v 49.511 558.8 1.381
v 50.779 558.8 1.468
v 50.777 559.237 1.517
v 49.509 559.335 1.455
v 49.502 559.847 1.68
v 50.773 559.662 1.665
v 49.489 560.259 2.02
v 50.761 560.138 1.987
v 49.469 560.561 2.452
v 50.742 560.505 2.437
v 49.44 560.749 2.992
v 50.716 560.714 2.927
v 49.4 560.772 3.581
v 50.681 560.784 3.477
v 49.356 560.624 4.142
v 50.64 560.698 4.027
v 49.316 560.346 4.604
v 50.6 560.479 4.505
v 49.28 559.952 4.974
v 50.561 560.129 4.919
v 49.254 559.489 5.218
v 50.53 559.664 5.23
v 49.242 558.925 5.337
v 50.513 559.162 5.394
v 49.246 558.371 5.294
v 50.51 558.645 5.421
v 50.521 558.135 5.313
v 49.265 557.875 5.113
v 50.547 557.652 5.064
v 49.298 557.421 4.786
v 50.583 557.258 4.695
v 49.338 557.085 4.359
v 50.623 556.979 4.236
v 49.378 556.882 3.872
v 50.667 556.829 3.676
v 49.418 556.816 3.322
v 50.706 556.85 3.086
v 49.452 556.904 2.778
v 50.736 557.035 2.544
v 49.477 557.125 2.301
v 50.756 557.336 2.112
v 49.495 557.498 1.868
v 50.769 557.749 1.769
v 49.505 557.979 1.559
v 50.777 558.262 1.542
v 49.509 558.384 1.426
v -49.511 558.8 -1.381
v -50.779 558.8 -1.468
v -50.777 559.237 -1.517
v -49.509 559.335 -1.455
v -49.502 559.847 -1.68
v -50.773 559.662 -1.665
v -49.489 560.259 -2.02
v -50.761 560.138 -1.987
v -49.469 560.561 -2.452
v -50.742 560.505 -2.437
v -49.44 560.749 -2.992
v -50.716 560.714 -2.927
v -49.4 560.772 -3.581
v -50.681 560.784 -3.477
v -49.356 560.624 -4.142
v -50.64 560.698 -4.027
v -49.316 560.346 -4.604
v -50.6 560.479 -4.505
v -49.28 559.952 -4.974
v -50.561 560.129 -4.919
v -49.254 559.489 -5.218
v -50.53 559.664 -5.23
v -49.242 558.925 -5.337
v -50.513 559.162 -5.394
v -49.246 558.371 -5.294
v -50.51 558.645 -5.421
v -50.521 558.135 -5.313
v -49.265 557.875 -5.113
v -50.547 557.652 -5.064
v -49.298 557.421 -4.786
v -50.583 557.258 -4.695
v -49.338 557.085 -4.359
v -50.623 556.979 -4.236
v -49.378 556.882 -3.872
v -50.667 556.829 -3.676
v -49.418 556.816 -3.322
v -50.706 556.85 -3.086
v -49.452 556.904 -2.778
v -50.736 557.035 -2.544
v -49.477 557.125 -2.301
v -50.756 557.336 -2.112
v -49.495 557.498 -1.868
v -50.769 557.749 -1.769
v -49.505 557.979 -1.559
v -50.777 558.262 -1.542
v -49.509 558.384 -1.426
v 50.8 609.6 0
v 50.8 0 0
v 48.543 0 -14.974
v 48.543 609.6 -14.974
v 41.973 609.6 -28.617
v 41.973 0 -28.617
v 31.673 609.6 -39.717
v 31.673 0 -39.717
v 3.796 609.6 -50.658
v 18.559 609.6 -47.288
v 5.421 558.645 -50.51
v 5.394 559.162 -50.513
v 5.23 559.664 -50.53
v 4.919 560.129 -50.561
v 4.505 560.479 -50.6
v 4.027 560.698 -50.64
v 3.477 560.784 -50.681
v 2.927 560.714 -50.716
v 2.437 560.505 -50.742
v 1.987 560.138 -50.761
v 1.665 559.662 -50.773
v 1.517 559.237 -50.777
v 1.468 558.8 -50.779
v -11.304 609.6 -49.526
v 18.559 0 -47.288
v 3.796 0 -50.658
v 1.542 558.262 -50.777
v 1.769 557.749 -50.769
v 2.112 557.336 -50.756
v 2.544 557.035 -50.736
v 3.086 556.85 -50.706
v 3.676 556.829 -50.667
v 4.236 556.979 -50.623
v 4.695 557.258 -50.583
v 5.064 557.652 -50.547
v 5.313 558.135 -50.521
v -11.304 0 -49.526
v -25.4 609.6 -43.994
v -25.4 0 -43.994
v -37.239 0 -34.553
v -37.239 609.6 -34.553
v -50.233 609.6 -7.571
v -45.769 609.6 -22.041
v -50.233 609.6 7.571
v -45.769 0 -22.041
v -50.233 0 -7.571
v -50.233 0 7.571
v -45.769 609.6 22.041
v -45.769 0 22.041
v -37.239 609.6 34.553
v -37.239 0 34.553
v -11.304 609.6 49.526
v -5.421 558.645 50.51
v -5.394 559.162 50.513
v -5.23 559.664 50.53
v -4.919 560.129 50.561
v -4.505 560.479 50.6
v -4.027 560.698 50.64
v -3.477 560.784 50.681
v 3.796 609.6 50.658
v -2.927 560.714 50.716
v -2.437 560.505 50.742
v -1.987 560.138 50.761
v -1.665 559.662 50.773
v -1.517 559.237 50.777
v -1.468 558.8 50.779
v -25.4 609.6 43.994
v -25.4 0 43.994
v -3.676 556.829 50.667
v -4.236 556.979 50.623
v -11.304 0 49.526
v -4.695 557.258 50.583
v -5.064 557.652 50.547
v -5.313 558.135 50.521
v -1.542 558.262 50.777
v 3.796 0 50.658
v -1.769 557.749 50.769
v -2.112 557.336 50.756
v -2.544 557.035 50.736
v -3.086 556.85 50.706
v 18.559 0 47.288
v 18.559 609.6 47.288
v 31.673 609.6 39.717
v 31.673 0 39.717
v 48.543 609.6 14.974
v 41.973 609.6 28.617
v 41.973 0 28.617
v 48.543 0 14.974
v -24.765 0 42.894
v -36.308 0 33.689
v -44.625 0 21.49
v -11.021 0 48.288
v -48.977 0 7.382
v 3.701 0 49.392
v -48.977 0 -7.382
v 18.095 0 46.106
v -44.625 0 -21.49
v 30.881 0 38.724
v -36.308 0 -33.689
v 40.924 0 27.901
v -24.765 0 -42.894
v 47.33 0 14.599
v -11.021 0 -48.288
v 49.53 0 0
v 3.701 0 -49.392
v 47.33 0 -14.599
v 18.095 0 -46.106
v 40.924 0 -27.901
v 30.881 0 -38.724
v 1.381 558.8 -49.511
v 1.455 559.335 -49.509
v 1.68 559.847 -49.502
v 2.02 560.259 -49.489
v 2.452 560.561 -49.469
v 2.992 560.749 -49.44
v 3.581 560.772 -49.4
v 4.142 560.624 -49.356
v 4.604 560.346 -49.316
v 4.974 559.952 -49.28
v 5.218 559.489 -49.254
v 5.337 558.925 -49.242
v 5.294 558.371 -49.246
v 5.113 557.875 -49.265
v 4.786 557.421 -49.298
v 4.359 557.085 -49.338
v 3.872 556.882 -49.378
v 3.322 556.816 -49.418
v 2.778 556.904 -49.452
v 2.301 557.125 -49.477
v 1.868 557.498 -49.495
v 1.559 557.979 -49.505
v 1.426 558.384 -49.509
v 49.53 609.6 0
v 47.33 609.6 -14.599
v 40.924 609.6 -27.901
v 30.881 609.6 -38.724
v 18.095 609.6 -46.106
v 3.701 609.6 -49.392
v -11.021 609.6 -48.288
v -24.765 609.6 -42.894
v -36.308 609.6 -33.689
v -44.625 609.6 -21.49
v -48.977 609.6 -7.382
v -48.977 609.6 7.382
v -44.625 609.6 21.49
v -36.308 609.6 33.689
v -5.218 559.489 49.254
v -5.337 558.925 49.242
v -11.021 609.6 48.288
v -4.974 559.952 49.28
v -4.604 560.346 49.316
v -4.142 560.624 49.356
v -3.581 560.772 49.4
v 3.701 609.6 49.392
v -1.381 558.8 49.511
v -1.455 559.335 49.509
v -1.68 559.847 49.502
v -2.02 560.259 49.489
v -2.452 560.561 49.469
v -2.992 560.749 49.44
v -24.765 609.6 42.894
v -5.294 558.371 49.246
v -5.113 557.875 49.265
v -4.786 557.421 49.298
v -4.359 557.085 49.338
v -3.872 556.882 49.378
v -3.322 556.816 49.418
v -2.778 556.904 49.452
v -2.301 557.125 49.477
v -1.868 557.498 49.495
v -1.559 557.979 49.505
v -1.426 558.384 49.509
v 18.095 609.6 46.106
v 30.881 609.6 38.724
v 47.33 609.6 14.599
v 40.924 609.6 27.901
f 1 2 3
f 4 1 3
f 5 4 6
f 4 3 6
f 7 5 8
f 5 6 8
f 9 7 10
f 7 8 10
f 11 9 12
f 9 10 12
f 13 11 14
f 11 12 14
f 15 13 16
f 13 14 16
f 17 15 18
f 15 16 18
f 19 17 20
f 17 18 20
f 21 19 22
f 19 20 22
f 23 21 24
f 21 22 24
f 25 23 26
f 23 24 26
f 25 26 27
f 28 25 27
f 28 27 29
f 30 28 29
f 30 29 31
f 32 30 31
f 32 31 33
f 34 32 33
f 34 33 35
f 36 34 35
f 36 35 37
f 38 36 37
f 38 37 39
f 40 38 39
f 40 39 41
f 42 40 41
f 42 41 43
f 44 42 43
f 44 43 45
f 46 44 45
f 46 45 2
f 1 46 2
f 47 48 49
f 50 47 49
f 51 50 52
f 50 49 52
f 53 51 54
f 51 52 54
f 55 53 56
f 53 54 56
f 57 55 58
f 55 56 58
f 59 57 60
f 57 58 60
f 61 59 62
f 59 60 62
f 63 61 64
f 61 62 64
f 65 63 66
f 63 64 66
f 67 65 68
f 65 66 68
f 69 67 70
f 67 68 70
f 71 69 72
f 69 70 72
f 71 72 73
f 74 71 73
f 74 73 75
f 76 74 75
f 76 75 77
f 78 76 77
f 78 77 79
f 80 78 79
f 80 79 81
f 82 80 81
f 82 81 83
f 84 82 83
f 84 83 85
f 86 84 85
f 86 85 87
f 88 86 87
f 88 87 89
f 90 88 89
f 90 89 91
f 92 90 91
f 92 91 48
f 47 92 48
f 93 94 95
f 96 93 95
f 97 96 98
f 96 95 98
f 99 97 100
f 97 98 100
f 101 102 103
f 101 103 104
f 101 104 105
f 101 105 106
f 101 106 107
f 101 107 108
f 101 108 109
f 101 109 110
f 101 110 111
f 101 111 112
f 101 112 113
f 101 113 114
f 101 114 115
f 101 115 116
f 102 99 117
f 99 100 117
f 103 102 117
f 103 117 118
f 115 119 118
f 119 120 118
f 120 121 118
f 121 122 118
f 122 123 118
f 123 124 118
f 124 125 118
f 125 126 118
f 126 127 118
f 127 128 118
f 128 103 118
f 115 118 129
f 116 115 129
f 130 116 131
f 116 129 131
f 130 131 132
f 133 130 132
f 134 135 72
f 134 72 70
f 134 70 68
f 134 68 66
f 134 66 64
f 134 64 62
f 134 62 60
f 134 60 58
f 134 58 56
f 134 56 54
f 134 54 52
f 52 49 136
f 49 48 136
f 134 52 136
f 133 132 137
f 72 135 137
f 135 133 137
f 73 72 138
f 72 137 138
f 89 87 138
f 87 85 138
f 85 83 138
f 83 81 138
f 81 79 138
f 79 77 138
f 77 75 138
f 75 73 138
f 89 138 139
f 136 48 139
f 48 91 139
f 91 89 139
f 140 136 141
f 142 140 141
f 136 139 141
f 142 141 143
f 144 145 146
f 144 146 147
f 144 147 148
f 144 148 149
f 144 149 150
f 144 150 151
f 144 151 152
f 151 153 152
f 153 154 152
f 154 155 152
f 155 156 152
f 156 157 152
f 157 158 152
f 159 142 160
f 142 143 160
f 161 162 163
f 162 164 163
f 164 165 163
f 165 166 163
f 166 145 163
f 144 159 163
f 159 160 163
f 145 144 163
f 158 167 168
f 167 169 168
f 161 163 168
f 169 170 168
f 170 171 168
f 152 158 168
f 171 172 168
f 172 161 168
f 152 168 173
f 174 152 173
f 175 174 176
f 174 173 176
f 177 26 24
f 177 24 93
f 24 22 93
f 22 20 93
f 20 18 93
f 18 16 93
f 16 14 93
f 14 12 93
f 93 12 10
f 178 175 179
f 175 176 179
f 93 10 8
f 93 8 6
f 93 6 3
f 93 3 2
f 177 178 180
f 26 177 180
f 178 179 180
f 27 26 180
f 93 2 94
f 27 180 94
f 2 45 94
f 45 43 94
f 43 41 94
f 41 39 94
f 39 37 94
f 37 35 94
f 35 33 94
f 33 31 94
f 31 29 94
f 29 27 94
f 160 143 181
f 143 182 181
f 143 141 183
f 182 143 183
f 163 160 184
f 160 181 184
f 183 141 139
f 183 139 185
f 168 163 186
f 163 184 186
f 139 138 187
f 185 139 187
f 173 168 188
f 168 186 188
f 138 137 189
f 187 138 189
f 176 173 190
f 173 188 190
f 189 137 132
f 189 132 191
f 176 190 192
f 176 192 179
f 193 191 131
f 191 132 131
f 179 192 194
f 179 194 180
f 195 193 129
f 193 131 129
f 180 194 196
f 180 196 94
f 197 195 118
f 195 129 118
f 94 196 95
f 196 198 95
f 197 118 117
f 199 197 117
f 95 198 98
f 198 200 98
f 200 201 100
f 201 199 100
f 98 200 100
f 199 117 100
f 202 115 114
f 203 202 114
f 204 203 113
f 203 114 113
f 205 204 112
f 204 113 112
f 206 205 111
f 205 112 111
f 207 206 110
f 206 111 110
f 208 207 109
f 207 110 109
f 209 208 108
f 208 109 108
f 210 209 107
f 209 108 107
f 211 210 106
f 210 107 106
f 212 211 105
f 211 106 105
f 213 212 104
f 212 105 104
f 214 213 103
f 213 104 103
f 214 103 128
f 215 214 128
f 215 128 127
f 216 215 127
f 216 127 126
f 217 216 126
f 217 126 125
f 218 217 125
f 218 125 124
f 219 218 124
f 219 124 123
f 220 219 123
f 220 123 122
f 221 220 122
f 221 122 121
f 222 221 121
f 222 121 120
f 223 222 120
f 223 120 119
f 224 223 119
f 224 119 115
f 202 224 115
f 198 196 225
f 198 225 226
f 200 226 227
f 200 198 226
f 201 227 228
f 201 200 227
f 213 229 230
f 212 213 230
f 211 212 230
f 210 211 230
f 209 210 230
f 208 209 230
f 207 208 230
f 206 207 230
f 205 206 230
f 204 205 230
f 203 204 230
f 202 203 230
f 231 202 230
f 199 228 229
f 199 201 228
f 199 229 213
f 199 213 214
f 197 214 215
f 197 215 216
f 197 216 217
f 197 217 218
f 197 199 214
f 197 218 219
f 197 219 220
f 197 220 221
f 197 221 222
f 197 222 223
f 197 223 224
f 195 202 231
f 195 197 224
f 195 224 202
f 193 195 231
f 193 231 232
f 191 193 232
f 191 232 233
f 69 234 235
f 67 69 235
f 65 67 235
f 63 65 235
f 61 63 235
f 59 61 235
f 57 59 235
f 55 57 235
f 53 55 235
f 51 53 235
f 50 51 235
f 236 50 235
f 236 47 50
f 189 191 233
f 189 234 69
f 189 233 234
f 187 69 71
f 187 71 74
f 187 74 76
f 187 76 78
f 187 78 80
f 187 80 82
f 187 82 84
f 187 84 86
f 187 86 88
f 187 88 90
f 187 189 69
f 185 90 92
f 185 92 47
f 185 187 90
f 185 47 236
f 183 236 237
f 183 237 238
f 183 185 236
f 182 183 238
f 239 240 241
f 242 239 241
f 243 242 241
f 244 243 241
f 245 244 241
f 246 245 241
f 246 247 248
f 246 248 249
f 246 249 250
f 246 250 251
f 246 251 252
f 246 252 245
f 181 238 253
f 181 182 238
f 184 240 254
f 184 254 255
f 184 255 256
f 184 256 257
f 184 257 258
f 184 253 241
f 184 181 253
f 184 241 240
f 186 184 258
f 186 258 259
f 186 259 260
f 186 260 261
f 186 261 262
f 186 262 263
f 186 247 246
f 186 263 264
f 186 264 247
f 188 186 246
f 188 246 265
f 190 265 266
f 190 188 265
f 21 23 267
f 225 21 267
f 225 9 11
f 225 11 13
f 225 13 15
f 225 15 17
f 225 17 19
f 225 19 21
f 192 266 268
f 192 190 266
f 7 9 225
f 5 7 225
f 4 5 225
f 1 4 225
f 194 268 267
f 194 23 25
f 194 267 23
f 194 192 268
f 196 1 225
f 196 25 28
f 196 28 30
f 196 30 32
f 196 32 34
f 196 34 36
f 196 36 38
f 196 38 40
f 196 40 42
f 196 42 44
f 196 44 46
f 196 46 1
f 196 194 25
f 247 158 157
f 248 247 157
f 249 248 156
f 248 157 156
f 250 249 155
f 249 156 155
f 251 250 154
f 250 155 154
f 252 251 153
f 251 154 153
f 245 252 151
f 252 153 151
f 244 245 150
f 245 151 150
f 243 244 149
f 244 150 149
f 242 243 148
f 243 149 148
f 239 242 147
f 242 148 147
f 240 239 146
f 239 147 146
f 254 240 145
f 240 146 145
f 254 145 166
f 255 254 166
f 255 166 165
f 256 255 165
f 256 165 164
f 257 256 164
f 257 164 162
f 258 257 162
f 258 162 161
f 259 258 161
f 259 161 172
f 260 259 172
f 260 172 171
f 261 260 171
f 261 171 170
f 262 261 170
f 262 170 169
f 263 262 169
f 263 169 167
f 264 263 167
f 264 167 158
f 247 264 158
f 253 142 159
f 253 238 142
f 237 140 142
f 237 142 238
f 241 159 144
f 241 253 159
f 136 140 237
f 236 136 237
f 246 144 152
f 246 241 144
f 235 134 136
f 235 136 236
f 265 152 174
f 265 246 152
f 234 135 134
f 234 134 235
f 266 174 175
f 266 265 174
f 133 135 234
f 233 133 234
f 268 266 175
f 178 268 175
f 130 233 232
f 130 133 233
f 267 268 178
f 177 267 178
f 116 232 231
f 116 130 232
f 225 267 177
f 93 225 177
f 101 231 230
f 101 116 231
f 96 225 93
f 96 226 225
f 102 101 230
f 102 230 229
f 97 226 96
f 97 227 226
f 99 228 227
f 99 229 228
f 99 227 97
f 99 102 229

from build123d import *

# Parameters (mm, degrees)
SKETCH1_R           = 50.8
SKETCH1_R_2         = 49.53
BOSS_EXTRUDE1_DEPTH = 609.6
SKETCH2_R           = 1.984375
CUT_EXTRUDE1_DEPTH  = 12.7
CIRPATTERN1_COUNT   = 4


with BuildPart() as part:
    # Sketch1 → Boss-Extrude1 (new body)
    with BuildSketch(Plane(origin=(0, 0, 0), x_dir=(1, 0, 0), z_dir=(0, 1, 0))):
        Circle(SKETCH1_R)
        Circle(SKETCH1_R_2, mode=Mode.SUBTRACT)
    extrude(amount=BOSS_EXTRUDE1_DEPTH)

    # Sketch2 → Cut-Extrude1 (cut)
    with BuildSketch(Plane(origin=(122.899951256, 815.595371644, -42.551362721), x_dir=(-0.997691035, 0, -0.067916112), z_dir=(0.067916112, 0, -0.997691035))):
        with Locations((119.72625647, -256.795371644)):
            Circle(SKETCH2_R)
    cut_extrude1 = extrude(amount=-CUT_EXTRUDE1_DEPTH, mode=Mode.SUBTRACT)

    # CirPattern1: Cut-Extrude1 ×4 about axis
    cirpattern1_axis = Axis((0, 0, 0), (0, -1, 0))
    for i in range(1, CIRPATTERN1_COUNT):
        add(cut_extrude1.rotate(cirpattern1_axis, i * 360 / CIRPATTERN1_COUNT), mode=Mode.SUBTRACT)


solid = part.part
